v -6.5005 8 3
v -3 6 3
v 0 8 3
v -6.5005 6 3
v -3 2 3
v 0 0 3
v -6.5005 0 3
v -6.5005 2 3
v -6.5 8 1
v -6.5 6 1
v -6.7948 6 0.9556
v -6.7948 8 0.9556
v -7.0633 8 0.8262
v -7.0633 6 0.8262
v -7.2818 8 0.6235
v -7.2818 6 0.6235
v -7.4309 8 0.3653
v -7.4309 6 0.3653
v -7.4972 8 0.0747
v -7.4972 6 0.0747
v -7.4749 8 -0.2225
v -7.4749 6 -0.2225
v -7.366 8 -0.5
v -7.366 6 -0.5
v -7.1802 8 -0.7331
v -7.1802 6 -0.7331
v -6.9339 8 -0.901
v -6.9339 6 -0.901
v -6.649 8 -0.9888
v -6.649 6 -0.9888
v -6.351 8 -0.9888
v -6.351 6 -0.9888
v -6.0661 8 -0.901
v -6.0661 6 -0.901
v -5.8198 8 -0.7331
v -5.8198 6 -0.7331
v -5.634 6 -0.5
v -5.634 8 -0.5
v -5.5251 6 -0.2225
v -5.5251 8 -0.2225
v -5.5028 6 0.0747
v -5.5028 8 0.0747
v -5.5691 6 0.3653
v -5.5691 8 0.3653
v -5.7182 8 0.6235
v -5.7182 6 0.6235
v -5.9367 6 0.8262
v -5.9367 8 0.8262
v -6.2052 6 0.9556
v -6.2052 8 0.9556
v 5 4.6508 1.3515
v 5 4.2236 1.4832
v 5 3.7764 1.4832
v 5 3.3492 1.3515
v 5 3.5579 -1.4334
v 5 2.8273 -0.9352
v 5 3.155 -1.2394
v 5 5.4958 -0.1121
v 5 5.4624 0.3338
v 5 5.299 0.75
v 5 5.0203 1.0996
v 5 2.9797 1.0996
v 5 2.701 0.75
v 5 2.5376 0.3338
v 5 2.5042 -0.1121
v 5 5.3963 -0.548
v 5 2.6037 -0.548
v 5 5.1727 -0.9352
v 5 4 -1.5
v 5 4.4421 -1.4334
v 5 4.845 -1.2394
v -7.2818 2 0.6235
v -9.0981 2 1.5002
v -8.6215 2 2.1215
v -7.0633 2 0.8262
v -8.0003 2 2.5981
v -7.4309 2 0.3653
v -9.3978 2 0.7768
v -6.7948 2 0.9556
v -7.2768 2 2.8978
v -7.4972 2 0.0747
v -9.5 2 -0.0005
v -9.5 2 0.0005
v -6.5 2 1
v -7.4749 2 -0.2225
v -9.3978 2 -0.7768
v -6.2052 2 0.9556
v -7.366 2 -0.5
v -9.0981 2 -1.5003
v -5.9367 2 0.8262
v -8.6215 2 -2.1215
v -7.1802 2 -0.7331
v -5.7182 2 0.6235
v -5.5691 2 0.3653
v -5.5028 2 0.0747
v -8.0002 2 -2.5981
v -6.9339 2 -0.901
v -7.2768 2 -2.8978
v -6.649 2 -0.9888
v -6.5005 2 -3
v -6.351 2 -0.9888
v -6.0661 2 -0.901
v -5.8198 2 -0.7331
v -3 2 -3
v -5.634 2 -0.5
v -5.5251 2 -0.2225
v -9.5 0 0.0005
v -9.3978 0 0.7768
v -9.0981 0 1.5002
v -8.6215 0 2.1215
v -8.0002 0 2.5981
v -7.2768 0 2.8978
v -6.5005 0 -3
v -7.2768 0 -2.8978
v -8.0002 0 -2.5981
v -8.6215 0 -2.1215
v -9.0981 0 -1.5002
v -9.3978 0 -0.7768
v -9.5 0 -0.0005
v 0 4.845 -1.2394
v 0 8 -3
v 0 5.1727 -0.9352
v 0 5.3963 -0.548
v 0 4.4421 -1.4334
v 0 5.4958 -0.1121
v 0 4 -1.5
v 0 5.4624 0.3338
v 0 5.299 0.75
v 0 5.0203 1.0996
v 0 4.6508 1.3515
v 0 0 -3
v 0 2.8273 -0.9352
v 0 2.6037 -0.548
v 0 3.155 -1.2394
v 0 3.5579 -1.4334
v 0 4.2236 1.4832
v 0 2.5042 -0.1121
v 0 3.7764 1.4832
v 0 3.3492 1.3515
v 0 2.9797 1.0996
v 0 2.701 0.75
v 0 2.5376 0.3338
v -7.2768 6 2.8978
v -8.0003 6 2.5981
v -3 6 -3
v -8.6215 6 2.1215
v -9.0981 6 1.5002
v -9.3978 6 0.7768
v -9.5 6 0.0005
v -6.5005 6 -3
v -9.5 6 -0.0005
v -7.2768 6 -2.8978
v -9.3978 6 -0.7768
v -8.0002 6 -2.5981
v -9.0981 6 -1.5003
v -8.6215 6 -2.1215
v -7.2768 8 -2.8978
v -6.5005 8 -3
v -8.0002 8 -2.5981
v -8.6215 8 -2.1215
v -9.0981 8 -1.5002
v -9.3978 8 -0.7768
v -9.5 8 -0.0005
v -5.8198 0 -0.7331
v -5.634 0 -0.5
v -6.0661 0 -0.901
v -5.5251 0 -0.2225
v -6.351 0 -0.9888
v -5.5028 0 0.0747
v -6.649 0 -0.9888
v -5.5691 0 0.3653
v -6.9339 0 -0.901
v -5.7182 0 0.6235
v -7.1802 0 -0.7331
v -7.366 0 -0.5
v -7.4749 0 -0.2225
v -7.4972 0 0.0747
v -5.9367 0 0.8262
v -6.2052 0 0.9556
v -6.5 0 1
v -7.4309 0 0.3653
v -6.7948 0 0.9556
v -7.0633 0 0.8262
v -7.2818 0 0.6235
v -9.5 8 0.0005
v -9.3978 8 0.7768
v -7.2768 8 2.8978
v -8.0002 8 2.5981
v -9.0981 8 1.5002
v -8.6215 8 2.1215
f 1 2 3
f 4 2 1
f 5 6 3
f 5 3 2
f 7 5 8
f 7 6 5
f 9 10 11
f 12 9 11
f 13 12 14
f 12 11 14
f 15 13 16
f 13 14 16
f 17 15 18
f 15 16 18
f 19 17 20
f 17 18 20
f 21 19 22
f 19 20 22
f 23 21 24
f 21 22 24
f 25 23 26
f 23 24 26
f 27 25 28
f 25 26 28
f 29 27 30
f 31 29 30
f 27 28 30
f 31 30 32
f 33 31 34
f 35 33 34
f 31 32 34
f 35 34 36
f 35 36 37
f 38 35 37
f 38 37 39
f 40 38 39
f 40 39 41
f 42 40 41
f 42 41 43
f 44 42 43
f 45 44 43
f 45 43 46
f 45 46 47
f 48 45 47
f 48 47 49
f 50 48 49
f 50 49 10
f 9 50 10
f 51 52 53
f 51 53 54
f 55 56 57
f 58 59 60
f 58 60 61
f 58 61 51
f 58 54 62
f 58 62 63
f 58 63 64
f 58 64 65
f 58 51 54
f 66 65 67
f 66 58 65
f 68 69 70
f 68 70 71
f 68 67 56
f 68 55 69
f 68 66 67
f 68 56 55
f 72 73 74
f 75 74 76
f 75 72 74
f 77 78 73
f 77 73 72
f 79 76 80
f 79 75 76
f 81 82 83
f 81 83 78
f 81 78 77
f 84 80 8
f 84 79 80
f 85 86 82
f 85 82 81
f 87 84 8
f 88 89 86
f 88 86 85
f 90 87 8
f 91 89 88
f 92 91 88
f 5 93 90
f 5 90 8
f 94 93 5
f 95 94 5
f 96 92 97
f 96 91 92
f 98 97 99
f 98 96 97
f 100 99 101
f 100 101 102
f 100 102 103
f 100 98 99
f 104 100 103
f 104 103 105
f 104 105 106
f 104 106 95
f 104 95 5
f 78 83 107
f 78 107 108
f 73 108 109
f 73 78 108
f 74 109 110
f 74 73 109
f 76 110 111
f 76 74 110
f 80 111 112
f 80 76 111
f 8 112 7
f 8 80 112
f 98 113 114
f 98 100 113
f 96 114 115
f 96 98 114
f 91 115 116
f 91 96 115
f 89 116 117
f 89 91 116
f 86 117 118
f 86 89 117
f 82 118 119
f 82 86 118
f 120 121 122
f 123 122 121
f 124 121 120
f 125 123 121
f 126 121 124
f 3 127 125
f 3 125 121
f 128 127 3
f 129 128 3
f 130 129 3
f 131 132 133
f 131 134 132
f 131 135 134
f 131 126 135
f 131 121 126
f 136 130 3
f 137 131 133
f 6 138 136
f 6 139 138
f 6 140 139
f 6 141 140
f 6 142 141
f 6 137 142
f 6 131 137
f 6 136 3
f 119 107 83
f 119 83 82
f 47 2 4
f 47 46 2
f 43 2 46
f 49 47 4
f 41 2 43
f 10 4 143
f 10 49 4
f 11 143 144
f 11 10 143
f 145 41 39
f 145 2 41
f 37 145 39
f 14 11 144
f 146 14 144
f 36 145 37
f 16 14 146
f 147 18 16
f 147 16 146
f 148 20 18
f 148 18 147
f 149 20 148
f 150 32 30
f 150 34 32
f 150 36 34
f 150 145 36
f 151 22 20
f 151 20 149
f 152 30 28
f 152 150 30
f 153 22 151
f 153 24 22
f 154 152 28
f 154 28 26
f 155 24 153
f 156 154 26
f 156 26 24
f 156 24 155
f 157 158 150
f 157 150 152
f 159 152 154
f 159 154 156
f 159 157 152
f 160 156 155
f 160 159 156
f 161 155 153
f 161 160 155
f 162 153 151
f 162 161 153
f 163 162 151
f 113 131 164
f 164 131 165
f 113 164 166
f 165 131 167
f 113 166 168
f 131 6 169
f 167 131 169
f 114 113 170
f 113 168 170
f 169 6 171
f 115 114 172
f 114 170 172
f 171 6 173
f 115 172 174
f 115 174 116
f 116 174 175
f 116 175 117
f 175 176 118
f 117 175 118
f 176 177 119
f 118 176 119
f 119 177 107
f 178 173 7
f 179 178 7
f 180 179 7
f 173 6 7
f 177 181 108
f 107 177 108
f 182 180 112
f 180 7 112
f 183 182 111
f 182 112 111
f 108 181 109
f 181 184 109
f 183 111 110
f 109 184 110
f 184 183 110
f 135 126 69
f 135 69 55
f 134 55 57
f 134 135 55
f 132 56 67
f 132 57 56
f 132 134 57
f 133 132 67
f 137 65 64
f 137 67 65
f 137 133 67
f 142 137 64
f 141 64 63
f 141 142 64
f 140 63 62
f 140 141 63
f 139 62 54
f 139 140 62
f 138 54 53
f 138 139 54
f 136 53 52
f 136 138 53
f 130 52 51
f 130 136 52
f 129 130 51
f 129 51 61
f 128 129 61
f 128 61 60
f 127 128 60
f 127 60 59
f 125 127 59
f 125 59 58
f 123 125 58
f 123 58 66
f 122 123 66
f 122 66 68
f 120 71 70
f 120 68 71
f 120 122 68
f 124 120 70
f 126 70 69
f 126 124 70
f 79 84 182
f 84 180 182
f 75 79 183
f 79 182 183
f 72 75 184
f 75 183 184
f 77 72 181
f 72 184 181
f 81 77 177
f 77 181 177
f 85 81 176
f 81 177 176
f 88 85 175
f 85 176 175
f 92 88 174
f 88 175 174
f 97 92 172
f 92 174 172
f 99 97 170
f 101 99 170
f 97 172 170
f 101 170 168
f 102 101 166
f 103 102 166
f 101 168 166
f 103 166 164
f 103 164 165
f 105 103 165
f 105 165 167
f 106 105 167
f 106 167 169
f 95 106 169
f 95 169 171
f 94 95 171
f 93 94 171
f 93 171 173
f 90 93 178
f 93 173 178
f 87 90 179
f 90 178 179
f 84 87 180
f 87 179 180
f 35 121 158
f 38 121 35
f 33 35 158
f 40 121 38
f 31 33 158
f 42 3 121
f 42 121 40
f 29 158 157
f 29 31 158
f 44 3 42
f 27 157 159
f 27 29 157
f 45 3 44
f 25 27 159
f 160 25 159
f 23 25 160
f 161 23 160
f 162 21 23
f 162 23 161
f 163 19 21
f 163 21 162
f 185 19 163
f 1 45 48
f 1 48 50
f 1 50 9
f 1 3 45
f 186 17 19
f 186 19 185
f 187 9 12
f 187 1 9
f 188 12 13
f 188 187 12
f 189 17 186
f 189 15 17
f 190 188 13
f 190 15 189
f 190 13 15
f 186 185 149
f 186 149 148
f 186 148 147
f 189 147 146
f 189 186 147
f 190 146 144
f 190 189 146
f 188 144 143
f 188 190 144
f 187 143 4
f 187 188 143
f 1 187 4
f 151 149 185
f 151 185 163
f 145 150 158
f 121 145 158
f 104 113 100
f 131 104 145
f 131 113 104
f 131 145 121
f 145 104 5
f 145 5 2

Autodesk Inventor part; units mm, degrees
ref_plane "YZ Plane" through (0, 0, 0) normal (1, 0, 0) x (0, 1, 0)
ref_plane "XZ Plane" through (0, 0, 0) normal (0, 1, 0) x (-1, 0, 0)
ref_plane "XY Plane" through (0, 0, 0) normal (0, 0, 1) x (1, 0, 0)
sketch "Skizze1" plane through (0, 0, 0) normal (0, 1, 0) x (-1, 0, 0)
  line L0 (0, 3) -> (9.5, 3)
  line L1 (9.5, 3) -> (9.5, -3)
  line L2 (9.5, -3) -> (0, -3)
  line L3 (0, -3) -> (0, 3)
  point P0 (0, 0)
  point P1 (0, 0)
  dimension "d0" = 6
  dimension "d1" = 9.5
extrude "Extrusion1" add sketch "Skizze1" along normal blind 8
fillet "Rundung1" radius 3 2 edges at (-9.5, 4, -3) (-9.5, 4, 3)
sketch "Skizze5" plane through (0, 8, 0) normal (0, 1, 0) x (1, 0, 0)
  arc A0 (-6.5, 3) -> (-6.5, -3) centre (-6.5, 0) ccw projected
  point P0 (0, 0)
hole "Bohrung2" at (-6.5, 8, 0) direction (0, -1, 0) diameter 2 depth 8
sketch "Skizze3" plane through (0, 0, -3) normal (0, 0, -1) x (-1, 0, 0)
  line L0 (3, 6) -> (11.5, 6)
  line L1 (11.5, 6) -> (11.5, 2)
  line L2 (11.5, 2) -> (3, 2)
  line L3 (3, 2) -> (3, 6)
  line L4 (9.5, 0) -> (9.5, 8) projected
  line L5 (0, 0) -> (0, 8) projected
  point P0 (3, 4)
  point P1 (0, 4)
  point P2 (7.25, 2)
  point P3 (11.5, 4)
  dimension "d12" = 6.5
  dimension "d13" = 4
  dimension "d14" = 2
extrude "Extrusion2" cut sketch "Skizze3" against normal up to surface (6 mm away)
sketch "Skizze4" plane through (0, 0, 3) normal (1, 0, 0) x (0, 0, -1)
  circle A0 centre (3, 4) radius 1.5
  line L0 (6, 0) -> (6, 8) projected
  line L1 (0, 0) -> (6, 0) projected
  point P0 (3, 0)
  point P1 (6, 4)
  point P2 (3, 0)
  dimension "d17" = 3
extrude "Extrusion3" add sketch "Skizze4" along normal blind 5
thread "Gewinde1" size "M3x0.5" class "6g" standard "ISO Metric profile" length 18
properties part number "top_pleuel"
